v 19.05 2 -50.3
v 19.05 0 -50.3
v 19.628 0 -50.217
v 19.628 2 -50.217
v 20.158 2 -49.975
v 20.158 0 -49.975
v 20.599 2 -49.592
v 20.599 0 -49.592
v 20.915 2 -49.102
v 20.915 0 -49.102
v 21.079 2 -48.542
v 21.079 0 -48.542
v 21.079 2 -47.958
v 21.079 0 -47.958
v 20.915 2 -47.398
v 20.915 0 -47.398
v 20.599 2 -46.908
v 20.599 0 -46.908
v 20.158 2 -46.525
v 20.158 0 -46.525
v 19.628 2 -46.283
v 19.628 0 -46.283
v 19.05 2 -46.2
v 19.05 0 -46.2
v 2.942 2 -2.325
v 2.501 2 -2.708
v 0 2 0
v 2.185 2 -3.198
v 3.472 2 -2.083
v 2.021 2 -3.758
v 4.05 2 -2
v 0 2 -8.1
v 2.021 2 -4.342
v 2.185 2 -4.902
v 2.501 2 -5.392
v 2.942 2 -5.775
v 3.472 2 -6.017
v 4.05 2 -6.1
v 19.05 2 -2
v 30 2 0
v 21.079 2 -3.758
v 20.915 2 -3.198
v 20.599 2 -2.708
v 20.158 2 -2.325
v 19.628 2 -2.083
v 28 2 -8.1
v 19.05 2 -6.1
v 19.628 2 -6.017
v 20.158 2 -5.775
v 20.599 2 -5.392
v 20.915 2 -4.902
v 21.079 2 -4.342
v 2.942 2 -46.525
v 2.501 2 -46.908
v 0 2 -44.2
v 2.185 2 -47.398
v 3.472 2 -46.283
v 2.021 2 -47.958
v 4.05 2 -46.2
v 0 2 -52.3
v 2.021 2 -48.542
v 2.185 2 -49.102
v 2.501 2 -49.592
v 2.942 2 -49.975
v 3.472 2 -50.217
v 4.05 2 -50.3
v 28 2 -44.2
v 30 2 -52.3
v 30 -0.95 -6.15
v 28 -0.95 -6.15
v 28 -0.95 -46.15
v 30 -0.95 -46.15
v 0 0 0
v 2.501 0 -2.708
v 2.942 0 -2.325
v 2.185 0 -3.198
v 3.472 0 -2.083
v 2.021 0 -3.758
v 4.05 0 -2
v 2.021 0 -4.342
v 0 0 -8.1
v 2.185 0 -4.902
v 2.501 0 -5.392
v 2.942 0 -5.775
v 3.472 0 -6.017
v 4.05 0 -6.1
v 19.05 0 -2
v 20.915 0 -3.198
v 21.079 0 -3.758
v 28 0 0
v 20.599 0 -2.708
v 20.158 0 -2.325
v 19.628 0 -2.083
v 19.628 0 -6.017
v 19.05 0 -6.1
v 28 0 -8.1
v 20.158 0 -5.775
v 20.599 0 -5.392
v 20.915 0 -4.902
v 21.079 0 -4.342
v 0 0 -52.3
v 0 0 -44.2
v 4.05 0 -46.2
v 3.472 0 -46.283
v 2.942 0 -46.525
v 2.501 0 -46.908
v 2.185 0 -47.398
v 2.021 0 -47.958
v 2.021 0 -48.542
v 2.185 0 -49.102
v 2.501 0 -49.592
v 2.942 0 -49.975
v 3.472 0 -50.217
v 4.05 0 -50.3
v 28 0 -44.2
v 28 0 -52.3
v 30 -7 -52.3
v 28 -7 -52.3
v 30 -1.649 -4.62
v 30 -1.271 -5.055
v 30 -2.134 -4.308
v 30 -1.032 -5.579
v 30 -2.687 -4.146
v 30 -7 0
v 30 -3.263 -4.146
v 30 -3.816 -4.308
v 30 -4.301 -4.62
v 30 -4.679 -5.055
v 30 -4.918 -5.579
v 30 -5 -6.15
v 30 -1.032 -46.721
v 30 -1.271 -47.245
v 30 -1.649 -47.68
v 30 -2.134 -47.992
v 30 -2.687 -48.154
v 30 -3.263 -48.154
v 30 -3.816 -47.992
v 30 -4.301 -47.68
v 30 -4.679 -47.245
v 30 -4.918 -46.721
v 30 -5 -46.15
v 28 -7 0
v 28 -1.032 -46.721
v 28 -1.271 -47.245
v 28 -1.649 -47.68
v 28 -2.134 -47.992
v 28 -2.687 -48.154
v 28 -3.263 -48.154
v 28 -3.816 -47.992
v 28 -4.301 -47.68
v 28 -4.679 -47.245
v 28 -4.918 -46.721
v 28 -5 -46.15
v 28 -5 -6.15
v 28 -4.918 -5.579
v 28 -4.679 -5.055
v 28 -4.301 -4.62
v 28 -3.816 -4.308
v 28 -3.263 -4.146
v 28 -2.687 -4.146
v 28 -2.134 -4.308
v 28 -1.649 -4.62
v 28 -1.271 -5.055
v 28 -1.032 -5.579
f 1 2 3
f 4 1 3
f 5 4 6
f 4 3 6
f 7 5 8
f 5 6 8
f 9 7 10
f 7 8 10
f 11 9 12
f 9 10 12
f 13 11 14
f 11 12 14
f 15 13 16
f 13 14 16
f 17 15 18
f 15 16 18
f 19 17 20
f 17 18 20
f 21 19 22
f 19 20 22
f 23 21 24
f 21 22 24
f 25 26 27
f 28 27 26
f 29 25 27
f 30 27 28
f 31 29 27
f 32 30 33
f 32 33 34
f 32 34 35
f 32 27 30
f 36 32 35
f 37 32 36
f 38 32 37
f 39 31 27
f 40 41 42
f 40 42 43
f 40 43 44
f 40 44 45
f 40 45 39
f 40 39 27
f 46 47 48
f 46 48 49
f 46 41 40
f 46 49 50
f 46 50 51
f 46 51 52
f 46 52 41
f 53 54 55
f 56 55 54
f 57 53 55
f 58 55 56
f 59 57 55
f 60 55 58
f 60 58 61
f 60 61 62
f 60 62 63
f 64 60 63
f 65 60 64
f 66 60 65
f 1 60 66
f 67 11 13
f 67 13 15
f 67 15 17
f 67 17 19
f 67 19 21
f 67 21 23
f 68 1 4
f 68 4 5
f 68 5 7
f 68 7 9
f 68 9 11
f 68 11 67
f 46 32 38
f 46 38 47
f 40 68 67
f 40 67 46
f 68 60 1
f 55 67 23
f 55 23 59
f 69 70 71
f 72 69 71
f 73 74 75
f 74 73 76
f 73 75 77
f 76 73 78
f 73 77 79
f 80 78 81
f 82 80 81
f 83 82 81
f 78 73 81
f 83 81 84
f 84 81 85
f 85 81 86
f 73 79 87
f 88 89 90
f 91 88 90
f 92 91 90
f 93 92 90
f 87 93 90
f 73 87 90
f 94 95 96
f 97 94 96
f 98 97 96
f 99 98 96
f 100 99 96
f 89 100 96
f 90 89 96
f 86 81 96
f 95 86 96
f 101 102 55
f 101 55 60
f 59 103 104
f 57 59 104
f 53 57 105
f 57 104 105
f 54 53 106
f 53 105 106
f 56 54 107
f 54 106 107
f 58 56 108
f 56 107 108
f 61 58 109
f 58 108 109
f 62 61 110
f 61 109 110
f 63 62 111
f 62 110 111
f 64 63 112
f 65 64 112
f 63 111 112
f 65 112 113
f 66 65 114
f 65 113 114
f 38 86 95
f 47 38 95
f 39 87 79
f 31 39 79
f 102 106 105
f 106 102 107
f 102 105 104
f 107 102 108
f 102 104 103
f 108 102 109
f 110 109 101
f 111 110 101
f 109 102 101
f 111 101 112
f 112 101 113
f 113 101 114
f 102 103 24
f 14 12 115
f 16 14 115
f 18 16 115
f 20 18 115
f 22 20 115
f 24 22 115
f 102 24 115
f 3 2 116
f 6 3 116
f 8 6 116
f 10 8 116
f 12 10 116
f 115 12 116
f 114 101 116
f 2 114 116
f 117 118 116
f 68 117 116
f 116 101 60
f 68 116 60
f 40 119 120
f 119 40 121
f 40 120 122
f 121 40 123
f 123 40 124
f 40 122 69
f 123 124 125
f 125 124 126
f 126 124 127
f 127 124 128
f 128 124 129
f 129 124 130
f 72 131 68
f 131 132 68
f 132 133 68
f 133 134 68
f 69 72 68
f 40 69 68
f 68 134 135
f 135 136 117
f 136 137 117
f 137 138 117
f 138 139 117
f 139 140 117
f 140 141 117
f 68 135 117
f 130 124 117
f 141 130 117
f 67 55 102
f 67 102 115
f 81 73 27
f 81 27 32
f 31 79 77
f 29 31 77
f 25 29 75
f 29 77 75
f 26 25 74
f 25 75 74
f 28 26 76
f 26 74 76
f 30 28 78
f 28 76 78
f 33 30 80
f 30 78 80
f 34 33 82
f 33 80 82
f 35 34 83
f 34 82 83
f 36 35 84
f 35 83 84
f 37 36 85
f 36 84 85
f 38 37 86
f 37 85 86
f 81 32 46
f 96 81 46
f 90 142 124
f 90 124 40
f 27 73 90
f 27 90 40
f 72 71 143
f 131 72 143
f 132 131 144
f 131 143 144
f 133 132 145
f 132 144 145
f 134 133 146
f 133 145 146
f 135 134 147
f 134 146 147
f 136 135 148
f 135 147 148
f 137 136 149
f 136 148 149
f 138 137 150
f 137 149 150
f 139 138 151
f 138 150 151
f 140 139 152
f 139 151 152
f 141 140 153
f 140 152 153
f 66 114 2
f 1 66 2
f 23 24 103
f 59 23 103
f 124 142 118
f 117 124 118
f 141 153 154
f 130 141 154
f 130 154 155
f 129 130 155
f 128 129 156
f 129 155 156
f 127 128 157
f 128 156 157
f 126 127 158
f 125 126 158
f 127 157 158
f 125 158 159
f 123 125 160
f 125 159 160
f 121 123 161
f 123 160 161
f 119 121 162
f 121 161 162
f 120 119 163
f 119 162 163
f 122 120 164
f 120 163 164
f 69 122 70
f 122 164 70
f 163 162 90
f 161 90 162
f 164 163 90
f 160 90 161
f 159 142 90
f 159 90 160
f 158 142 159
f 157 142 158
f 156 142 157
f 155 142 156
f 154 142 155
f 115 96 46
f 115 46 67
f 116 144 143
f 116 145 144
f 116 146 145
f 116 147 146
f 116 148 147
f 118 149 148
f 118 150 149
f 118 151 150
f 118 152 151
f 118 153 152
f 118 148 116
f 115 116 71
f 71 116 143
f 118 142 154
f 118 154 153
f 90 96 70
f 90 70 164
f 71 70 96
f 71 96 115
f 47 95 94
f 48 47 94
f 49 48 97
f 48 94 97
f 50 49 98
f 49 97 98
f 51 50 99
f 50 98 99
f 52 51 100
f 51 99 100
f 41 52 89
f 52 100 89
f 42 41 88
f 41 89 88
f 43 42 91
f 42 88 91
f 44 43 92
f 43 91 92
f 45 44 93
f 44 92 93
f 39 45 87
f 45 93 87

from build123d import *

# Parameters (mm, degrees)
SKETCH1_W           = 28
SKETCH1_H           = 26.15
BOSS_EXTRUDE1_DEPTH = 2
SKETCH12_W          = 52.3
SKETCH12_H          = 9
BOSS_EXTRUDE2_DEPTH = 2
SKETCH13_W          = 30
SKETCH13_H          = 36.1
CUT_EXTRUDE3_DEPTH  = 2
SKETCH15_W          = 2
SKETCH15_H          = 36.1
BOSS_EXTRUDE3_DEPTH = 2


with BuildPart() as part:
    # Sketch1 → Boss-Extrude1 (new body)
    # profile 1 of 2: a face of its own
    with BuildSketch(Plane(origin=(0, 0, 0), x_dir=(1, 0, 0), z_dir=(0, 1, 0))):
        with Locations((14, 39.225)):
            Rectangle(SKETCH1_W, SKETCH1_H)
        with BuildLine():
            Line((19.05, 46.2), (4.05, 46.2))
            ThreePointArc((4.05, 46.2), (2, 48.25), (4.05, 50.3))
            Line((4.05, 50.3), (19.05, 50.3))
            ThreePointArc((19.05, 50.3), (21.1, 48.25), (19.05, 46.2))
        make_face(mode=Mode.SUBTRACT)
    # profile 2 of 2: a face of its own
    with BuildSketch(Plane(origin=(0, 0, 0), x_dir=(1, 0, 0), z_dir=(0, 1, 0))):
        with Locations((14, 13.075)):
            Rectangle(SKETCH1_W, SKETCH1_H)
        with BuildLine():
            ThreePointArc((4.05, 2), (2, 4.05), (4.05, 6.1))
            Line((4.05, 6.1), (19.05, 6.1))
            ThreePointArc((19.05, 6.1), (21.1, 4.05), (19.05, 2))
            Line((19.05, 2), (4.05, 2))
        make_face(mode=Mode.SUBTRACT)
    extrude(amount=BOSS_EXTRUDE1_DEPTH)

    # Sketch12 → Boss-Extrude2 (add)
    with BuildSketch(Plane(origin=(28, 0, 0), x_dir=(0, 0, -1), z_dir=(1, 0, 0))):
        with Locations((26.15, -2.5)):
            Rectangle(SKETCH12_W, SKETCH12_H)
        with BuildLine():
            Line((6.15, -0.95), (46.15, -0.95))
            ThreePointArc((46.15, -0.95), (48.175, -2.975), (46.15, -5))
            Line((46.15, -5), (6.15, -5))
            ThreePointArc((6.15, -5), (4.125, -2.975), (6.15, -0.95))
        make_face(mode=Mode.SUBTRACT)
    extrude(amount=BOSS_EXTRUDE2_DEPTH)

    # Sketch13 → Cut-Extrude3 (cut)
    with BuildSketch(Plane(origin=(0, 2, 0), x_dir=(1, 0, 0), z_dir=(0, 1, 0))):
        with Locations((15, 26.15)):
            Rectangle(SKETCH13_W, SKETCH13_H)
    extrude(amount=-CUT_EXTRUDE3_DEPTH, mode=Mode.SUBTRACT)

    # Sketch15 → Boss-Extrude3 (add)
    with BuildSketch(Plane(origin=(0, 0, 0), x_dir=(1, 0, 0), z_dir=(0, 1, 0))):
        with Locations((29, 26.15)):
            Rectangle(SKETCH15_W, SKETCH15_H)
    extrude(amount=BOSS_EXTRUDE3_DEPTH)


solid = part.part
